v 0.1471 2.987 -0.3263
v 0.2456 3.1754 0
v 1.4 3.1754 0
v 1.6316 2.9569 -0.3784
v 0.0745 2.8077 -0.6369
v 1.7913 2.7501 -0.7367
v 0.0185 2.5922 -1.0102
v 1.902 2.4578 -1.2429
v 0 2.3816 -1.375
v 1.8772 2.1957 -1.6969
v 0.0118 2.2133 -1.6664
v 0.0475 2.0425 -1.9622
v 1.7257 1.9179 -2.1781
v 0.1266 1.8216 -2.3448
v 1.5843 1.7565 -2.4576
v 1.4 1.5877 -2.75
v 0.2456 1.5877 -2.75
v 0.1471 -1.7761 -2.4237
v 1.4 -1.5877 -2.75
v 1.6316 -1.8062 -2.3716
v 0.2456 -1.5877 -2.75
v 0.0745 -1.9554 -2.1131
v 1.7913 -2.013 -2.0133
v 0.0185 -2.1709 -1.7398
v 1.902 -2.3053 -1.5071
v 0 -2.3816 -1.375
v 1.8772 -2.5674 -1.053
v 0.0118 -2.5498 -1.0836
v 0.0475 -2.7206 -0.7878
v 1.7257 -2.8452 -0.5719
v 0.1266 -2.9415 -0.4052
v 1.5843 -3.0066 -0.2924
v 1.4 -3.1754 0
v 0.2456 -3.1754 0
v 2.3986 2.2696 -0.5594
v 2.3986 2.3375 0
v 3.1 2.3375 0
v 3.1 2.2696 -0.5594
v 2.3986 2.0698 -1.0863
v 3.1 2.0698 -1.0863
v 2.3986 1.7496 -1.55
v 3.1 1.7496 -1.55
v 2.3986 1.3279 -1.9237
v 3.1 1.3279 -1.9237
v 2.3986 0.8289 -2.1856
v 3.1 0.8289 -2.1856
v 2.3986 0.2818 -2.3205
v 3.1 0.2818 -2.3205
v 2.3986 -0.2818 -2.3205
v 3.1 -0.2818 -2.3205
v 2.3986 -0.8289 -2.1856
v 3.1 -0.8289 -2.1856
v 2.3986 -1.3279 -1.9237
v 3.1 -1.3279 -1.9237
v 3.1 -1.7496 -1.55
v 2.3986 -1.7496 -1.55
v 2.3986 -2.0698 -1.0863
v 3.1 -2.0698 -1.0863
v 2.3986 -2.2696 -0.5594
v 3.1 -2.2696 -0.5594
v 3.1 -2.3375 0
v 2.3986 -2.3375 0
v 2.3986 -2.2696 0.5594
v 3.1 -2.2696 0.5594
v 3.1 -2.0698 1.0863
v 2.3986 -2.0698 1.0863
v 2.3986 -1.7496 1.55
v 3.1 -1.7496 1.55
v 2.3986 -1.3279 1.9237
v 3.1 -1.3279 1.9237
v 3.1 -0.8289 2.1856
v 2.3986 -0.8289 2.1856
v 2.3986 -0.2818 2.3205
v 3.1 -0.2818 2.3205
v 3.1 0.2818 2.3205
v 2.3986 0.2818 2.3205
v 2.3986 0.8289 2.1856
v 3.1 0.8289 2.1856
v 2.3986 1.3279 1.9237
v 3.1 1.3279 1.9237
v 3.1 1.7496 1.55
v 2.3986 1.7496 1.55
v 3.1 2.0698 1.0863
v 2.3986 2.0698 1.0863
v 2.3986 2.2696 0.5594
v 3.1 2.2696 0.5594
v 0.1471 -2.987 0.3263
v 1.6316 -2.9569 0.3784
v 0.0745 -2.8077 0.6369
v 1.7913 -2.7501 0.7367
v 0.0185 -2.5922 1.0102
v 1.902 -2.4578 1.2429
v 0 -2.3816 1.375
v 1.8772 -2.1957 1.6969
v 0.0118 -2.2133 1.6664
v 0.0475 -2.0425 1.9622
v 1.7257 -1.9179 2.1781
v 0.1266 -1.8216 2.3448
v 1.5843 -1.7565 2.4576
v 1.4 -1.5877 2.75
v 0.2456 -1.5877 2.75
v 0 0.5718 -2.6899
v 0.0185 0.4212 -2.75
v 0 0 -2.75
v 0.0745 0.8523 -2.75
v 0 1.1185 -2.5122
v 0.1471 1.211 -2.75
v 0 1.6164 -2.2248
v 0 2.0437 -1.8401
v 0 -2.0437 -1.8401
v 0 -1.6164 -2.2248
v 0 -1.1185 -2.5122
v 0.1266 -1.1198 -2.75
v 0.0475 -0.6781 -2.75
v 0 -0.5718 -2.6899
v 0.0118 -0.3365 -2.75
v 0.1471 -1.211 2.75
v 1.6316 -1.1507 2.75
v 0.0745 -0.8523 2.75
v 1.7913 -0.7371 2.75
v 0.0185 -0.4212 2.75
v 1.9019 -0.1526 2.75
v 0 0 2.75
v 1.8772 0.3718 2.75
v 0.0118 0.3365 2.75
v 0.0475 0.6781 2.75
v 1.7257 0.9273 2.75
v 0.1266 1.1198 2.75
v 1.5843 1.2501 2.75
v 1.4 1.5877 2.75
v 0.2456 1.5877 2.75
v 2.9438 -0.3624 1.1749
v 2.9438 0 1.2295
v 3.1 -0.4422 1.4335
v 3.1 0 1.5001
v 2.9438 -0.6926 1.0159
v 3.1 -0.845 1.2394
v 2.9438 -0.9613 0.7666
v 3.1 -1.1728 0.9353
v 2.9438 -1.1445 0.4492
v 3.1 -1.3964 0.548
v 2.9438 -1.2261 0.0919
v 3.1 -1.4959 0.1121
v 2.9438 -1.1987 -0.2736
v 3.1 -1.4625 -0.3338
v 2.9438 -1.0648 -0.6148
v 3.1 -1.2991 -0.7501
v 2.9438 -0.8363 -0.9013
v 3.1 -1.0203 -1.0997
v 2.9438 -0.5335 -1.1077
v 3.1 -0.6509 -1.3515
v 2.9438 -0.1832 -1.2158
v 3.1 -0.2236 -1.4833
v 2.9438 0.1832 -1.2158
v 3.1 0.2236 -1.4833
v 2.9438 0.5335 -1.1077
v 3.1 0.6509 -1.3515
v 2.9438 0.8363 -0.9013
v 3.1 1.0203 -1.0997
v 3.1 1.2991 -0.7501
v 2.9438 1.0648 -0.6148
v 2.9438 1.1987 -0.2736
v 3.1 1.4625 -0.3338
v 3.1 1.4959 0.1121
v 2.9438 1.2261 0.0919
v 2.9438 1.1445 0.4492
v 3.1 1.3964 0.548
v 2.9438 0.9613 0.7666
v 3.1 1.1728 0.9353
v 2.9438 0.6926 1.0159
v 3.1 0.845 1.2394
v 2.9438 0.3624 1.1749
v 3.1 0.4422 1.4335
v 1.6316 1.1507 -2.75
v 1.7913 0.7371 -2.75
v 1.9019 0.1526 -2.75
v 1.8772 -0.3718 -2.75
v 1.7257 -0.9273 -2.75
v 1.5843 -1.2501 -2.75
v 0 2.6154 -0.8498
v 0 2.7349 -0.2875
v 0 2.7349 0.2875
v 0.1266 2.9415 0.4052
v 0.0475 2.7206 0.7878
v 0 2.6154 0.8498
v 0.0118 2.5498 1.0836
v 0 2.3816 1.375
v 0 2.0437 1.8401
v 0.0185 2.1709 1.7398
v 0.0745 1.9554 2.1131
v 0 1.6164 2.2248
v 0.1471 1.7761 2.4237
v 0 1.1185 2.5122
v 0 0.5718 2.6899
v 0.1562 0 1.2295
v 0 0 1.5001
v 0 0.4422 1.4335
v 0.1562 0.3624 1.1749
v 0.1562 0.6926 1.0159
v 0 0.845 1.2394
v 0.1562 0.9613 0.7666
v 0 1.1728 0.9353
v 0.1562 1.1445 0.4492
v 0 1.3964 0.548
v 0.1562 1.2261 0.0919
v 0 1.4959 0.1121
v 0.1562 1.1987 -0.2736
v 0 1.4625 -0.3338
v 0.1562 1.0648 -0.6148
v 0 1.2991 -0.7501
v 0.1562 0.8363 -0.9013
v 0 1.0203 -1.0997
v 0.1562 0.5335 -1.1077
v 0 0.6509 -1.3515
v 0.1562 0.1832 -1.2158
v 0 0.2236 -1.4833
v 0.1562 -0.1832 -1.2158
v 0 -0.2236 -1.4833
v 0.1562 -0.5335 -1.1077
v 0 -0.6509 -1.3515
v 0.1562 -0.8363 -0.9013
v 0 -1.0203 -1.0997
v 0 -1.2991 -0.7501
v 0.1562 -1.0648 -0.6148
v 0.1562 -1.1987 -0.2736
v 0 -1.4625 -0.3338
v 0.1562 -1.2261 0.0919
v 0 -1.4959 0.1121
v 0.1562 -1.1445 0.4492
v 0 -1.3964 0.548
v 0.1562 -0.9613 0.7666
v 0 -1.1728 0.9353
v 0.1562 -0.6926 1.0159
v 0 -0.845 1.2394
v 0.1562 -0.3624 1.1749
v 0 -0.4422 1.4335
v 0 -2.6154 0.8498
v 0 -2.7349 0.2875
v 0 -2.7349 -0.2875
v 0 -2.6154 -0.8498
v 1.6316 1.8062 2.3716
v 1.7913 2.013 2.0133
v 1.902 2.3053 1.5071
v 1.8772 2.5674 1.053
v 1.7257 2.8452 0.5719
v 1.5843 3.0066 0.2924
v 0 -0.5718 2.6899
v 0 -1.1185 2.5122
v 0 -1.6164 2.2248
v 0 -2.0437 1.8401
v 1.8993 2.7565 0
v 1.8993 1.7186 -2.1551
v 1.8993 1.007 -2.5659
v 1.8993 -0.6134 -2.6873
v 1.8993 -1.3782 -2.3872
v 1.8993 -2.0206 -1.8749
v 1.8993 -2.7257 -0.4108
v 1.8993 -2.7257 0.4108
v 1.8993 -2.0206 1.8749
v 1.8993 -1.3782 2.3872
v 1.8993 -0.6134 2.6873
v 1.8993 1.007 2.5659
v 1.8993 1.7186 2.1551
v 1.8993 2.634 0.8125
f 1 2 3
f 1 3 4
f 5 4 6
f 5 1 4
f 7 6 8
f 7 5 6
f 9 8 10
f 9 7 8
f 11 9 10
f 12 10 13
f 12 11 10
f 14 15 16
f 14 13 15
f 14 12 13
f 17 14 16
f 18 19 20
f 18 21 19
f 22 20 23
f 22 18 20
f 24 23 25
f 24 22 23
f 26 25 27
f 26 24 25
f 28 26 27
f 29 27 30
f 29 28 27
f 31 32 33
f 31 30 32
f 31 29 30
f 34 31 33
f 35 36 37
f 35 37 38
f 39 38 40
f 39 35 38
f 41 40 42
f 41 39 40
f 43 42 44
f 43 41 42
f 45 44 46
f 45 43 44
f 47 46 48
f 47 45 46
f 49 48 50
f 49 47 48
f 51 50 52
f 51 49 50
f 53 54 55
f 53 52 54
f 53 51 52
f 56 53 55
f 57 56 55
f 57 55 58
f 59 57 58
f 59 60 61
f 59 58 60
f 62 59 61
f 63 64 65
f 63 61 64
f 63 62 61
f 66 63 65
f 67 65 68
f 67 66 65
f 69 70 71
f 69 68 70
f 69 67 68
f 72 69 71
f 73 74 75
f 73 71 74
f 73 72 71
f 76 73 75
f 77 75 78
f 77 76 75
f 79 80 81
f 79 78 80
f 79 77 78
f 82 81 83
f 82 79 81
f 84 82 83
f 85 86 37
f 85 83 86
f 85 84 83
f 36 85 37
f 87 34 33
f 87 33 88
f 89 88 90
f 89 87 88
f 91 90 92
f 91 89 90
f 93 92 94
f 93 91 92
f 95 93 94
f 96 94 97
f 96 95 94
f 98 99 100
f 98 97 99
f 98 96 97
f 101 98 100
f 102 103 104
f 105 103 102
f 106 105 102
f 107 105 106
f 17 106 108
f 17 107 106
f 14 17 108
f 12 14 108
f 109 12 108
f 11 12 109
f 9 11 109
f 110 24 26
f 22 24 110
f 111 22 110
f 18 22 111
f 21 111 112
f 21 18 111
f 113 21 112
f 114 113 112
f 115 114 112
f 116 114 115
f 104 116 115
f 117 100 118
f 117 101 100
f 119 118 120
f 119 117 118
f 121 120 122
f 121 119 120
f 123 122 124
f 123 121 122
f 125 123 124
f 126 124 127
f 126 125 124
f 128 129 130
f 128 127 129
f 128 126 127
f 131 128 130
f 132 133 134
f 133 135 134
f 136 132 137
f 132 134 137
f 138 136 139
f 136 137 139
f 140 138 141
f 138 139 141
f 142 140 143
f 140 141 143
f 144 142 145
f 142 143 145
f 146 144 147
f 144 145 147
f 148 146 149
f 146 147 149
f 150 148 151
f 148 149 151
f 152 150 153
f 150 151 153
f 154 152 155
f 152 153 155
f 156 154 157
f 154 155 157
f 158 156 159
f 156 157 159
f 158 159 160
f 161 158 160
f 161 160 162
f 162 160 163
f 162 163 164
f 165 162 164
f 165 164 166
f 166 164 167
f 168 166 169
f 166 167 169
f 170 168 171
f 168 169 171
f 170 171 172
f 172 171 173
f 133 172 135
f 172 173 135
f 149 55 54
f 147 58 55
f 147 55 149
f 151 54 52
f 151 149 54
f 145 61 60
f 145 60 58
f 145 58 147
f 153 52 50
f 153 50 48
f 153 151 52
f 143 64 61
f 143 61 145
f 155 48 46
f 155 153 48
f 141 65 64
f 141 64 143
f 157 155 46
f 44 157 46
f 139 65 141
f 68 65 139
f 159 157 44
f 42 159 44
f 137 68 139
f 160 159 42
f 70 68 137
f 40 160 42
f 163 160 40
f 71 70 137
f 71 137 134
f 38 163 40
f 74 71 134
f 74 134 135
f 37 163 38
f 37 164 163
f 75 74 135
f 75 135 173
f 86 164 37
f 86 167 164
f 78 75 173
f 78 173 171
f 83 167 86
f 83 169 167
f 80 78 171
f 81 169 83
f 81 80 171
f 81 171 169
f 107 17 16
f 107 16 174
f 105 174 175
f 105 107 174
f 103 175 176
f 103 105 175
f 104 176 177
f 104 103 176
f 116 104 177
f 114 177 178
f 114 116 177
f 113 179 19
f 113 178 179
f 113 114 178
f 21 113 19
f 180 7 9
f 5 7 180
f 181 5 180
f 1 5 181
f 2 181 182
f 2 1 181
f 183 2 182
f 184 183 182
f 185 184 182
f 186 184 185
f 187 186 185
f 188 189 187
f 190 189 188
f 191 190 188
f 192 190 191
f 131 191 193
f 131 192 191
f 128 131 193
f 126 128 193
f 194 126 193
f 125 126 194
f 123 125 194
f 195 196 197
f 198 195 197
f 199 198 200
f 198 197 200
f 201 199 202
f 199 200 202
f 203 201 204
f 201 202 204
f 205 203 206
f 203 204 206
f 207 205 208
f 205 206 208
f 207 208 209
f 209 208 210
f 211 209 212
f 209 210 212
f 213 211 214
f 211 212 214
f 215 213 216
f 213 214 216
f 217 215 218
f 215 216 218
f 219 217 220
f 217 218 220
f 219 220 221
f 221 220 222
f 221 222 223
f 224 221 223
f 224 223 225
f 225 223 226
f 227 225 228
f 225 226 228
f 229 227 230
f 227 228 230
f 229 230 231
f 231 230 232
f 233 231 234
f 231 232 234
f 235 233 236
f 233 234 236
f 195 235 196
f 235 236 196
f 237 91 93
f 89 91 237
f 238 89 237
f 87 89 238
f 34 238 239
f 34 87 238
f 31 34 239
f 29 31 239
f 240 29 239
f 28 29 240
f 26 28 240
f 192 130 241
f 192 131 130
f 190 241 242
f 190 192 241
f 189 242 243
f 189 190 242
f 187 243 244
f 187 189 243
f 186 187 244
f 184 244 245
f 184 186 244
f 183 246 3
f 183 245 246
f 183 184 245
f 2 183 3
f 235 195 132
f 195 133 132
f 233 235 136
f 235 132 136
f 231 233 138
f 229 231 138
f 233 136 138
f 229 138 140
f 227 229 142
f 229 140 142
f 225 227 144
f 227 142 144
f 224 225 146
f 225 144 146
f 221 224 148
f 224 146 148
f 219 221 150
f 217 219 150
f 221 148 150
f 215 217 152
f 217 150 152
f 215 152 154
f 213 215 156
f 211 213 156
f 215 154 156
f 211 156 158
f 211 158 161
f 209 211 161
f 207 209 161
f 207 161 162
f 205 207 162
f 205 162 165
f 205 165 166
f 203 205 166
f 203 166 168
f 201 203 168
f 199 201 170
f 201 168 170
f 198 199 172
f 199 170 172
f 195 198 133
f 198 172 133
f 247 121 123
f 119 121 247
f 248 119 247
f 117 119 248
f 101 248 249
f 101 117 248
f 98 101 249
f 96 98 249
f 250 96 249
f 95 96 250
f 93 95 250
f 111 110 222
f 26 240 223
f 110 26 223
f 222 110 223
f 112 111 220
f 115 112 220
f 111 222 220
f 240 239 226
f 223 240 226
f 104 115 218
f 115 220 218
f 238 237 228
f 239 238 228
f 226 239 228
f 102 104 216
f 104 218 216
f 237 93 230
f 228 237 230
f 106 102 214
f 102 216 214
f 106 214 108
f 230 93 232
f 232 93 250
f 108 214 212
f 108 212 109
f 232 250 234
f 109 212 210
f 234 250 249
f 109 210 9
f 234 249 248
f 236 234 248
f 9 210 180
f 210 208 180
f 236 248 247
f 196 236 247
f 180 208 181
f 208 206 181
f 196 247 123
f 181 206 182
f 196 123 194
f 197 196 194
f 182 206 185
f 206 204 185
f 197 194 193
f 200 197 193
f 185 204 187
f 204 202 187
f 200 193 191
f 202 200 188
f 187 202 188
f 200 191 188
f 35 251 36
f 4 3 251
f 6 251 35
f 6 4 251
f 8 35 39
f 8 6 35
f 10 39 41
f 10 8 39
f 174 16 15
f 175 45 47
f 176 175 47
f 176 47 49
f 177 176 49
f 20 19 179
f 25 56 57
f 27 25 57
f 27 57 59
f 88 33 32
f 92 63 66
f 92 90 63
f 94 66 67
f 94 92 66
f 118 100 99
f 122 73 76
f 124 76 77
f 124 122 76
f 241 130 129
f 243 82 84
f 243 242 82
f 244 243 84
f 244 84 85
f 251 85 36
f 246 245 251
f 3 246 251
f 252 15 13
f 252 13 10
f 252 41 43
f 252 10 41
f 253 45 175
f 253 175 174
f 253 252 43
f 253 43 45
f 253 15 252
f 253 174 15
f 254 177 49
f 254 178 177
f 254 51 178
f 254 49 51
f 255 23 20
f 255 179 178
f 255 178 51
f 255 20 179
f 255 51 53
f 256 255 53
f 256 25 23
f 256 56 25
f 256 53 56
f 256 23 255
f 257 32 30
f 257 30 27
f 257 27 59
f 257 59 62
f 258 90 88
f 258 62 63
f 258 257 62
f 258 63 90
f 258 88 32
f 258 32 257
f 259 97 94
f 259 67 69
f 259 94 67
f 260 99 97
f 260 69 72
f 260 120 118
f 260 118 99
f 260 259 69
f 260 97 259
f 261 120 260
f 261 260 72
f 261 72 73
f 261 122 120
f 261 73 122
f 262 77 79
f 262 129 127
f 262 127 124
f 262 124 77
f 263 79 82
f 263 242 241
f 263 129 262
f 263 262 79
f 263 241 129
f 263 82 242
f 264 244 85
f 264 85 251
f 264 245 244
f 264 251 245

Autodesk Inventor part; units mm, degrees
ref_plane "YZ Plane" through (0, 0, 0) normal (1, 0, 0) x (0, 1, 0)
ref_plane "XZ Plane" through (0, 0, 0) normal (0, 1, 0) x (-1, 0, 0)
sketch "Sketch1" plane through (0, 0, 0) normal (1, 0, 0) x (0, 1, 0)
  line L0 (-3.1754, 0) -> (-1.5877, 2.75)
  line L1 (-1.5877, 2.75) -> (1.5877, 2.75)
  line L2 (1.5877, 2.75) -> (3.1754, 0)
  line L3 (3.1754, 0) -> (1.5877, -2.75)
  line L4 (1.5877, -2.75) -> (-1.5877, -2.75)
  line L5 (-1.5877, -2.75) -> (-3.1754, 0)
  point P0 (0, 0)
  point P1 (0, 0)
  dimension "d0" = 6.3509
extrude "Body" add sketch "Sketch1" along normal blind 3.1
sketch "Sketch2" plane through (0, 0, 0) normal (-1, 0, 0) x (0, 0, 1)
  line L0 (0, -4.4456) -> (0, 4.4456) projected
  line L1 (-3.85, 0) -> (3.85, 0) projected
  point P0 (0, 0)
hole "Thread" at (0, 0, 0) direction (1, 0, 0) diameter 2.459 end through all thread size "M3x0.5" class "6H" standard "ANSI Metric M Profile"
chamfer "Chamfer1" distance 0.2706 angle 30 1 edges at (0, 0, -1.2295) measured on face at (0, -1.925, -1.1495)
chamfer "Chamfer2" distance 0.2706 angle 30 1 edges at (3.1, 0, -1.2295) measured on face at (3.1, -1.925, -1.1495)
sketch "Sketch3" plane through (0, 0, 0) normal (0, 0, 1) x (1, 0, 0)
  line L0 (0, 1.5877) -> (0, 3.1754) projected
  line L1 (0, 3.1754) -> (3.1, 3.1754) projected
  line L2 (3.1, 1.5877) -> (3.1, 3.1754) projected
  line L3 (-0.62, 0) -> (3.72, 0) projected
  line L4 (0.2456, 3.1754) -> (0, 2.75)
  line L5 (3.1, 2.3375) -> (2.3986, 2.3375)
  line L6 (2.3986, 2.3375) -> (1.4, 3.1754)
  dimension "d3" = 30
  dimension "d5" = 5.5
  dimension "d6" = 4.675
  dimension "d8" = 50
  dimension "d9" = 1.4
revolve "Chamfer3" cut sketch "Sketch3" angle 360 about axis through (-10, 0, 0) along (1, 0, 0)
ref_plane "Work Plane1" through (8.9551, 0, 0) normal (0, 0, 1) x (-1, 0, 0)
equation "\"d0\" = 1.1547 * SW"
equation "\"d1\" = KOH"
equation "\"d3\" = ANG1"
equation "\"d5\" = SW0"
equation "\"d6\" = SW1"
equation "\"d8\" = ANG2"
equation "\"d9\" = KOH1"
equation "\"d10\" = -0.5 * GD1 + 0.5 * NND"
equation "\"d39\" = -0.5 * GD1 + 0.5 * NND"
equation "\"d12\" = -0.5 * GD1 + 0.5 * NND"
equation "\"d40\" = -0.5 * GD1 + 0.5 * NND"
equation "\"ANG1\" = 30deg"
equation "\"ANG2\" = 50deg"
equation "\"NND\" = 3"
equation "\"KOH\" = 3.1"
equation "\"SW\" = 5.5"
equation "\"SW0\" = SW"
equation "\"SW1\" = 0.85 * SW"
equation "\"KOH1\" = 1.4"
equation "\"GUL\" = 0.541266 * PTC"
equation "\"THREADDIA\" = 3"
equation "\"TOA\" = 30deg"
equation "\"PTC\" = 0.5"
equation "\"E0\" = 1.155 * SW"
equation "\"GAL\" = 0.541266 * PTC"
equation "\"GD1\" = 2.458734"
properties part number "ANSI B18.16.3M - Property Class 5 and 10 - Metric M3 x 0.5 Metal Type" material "Steel, Mild"
